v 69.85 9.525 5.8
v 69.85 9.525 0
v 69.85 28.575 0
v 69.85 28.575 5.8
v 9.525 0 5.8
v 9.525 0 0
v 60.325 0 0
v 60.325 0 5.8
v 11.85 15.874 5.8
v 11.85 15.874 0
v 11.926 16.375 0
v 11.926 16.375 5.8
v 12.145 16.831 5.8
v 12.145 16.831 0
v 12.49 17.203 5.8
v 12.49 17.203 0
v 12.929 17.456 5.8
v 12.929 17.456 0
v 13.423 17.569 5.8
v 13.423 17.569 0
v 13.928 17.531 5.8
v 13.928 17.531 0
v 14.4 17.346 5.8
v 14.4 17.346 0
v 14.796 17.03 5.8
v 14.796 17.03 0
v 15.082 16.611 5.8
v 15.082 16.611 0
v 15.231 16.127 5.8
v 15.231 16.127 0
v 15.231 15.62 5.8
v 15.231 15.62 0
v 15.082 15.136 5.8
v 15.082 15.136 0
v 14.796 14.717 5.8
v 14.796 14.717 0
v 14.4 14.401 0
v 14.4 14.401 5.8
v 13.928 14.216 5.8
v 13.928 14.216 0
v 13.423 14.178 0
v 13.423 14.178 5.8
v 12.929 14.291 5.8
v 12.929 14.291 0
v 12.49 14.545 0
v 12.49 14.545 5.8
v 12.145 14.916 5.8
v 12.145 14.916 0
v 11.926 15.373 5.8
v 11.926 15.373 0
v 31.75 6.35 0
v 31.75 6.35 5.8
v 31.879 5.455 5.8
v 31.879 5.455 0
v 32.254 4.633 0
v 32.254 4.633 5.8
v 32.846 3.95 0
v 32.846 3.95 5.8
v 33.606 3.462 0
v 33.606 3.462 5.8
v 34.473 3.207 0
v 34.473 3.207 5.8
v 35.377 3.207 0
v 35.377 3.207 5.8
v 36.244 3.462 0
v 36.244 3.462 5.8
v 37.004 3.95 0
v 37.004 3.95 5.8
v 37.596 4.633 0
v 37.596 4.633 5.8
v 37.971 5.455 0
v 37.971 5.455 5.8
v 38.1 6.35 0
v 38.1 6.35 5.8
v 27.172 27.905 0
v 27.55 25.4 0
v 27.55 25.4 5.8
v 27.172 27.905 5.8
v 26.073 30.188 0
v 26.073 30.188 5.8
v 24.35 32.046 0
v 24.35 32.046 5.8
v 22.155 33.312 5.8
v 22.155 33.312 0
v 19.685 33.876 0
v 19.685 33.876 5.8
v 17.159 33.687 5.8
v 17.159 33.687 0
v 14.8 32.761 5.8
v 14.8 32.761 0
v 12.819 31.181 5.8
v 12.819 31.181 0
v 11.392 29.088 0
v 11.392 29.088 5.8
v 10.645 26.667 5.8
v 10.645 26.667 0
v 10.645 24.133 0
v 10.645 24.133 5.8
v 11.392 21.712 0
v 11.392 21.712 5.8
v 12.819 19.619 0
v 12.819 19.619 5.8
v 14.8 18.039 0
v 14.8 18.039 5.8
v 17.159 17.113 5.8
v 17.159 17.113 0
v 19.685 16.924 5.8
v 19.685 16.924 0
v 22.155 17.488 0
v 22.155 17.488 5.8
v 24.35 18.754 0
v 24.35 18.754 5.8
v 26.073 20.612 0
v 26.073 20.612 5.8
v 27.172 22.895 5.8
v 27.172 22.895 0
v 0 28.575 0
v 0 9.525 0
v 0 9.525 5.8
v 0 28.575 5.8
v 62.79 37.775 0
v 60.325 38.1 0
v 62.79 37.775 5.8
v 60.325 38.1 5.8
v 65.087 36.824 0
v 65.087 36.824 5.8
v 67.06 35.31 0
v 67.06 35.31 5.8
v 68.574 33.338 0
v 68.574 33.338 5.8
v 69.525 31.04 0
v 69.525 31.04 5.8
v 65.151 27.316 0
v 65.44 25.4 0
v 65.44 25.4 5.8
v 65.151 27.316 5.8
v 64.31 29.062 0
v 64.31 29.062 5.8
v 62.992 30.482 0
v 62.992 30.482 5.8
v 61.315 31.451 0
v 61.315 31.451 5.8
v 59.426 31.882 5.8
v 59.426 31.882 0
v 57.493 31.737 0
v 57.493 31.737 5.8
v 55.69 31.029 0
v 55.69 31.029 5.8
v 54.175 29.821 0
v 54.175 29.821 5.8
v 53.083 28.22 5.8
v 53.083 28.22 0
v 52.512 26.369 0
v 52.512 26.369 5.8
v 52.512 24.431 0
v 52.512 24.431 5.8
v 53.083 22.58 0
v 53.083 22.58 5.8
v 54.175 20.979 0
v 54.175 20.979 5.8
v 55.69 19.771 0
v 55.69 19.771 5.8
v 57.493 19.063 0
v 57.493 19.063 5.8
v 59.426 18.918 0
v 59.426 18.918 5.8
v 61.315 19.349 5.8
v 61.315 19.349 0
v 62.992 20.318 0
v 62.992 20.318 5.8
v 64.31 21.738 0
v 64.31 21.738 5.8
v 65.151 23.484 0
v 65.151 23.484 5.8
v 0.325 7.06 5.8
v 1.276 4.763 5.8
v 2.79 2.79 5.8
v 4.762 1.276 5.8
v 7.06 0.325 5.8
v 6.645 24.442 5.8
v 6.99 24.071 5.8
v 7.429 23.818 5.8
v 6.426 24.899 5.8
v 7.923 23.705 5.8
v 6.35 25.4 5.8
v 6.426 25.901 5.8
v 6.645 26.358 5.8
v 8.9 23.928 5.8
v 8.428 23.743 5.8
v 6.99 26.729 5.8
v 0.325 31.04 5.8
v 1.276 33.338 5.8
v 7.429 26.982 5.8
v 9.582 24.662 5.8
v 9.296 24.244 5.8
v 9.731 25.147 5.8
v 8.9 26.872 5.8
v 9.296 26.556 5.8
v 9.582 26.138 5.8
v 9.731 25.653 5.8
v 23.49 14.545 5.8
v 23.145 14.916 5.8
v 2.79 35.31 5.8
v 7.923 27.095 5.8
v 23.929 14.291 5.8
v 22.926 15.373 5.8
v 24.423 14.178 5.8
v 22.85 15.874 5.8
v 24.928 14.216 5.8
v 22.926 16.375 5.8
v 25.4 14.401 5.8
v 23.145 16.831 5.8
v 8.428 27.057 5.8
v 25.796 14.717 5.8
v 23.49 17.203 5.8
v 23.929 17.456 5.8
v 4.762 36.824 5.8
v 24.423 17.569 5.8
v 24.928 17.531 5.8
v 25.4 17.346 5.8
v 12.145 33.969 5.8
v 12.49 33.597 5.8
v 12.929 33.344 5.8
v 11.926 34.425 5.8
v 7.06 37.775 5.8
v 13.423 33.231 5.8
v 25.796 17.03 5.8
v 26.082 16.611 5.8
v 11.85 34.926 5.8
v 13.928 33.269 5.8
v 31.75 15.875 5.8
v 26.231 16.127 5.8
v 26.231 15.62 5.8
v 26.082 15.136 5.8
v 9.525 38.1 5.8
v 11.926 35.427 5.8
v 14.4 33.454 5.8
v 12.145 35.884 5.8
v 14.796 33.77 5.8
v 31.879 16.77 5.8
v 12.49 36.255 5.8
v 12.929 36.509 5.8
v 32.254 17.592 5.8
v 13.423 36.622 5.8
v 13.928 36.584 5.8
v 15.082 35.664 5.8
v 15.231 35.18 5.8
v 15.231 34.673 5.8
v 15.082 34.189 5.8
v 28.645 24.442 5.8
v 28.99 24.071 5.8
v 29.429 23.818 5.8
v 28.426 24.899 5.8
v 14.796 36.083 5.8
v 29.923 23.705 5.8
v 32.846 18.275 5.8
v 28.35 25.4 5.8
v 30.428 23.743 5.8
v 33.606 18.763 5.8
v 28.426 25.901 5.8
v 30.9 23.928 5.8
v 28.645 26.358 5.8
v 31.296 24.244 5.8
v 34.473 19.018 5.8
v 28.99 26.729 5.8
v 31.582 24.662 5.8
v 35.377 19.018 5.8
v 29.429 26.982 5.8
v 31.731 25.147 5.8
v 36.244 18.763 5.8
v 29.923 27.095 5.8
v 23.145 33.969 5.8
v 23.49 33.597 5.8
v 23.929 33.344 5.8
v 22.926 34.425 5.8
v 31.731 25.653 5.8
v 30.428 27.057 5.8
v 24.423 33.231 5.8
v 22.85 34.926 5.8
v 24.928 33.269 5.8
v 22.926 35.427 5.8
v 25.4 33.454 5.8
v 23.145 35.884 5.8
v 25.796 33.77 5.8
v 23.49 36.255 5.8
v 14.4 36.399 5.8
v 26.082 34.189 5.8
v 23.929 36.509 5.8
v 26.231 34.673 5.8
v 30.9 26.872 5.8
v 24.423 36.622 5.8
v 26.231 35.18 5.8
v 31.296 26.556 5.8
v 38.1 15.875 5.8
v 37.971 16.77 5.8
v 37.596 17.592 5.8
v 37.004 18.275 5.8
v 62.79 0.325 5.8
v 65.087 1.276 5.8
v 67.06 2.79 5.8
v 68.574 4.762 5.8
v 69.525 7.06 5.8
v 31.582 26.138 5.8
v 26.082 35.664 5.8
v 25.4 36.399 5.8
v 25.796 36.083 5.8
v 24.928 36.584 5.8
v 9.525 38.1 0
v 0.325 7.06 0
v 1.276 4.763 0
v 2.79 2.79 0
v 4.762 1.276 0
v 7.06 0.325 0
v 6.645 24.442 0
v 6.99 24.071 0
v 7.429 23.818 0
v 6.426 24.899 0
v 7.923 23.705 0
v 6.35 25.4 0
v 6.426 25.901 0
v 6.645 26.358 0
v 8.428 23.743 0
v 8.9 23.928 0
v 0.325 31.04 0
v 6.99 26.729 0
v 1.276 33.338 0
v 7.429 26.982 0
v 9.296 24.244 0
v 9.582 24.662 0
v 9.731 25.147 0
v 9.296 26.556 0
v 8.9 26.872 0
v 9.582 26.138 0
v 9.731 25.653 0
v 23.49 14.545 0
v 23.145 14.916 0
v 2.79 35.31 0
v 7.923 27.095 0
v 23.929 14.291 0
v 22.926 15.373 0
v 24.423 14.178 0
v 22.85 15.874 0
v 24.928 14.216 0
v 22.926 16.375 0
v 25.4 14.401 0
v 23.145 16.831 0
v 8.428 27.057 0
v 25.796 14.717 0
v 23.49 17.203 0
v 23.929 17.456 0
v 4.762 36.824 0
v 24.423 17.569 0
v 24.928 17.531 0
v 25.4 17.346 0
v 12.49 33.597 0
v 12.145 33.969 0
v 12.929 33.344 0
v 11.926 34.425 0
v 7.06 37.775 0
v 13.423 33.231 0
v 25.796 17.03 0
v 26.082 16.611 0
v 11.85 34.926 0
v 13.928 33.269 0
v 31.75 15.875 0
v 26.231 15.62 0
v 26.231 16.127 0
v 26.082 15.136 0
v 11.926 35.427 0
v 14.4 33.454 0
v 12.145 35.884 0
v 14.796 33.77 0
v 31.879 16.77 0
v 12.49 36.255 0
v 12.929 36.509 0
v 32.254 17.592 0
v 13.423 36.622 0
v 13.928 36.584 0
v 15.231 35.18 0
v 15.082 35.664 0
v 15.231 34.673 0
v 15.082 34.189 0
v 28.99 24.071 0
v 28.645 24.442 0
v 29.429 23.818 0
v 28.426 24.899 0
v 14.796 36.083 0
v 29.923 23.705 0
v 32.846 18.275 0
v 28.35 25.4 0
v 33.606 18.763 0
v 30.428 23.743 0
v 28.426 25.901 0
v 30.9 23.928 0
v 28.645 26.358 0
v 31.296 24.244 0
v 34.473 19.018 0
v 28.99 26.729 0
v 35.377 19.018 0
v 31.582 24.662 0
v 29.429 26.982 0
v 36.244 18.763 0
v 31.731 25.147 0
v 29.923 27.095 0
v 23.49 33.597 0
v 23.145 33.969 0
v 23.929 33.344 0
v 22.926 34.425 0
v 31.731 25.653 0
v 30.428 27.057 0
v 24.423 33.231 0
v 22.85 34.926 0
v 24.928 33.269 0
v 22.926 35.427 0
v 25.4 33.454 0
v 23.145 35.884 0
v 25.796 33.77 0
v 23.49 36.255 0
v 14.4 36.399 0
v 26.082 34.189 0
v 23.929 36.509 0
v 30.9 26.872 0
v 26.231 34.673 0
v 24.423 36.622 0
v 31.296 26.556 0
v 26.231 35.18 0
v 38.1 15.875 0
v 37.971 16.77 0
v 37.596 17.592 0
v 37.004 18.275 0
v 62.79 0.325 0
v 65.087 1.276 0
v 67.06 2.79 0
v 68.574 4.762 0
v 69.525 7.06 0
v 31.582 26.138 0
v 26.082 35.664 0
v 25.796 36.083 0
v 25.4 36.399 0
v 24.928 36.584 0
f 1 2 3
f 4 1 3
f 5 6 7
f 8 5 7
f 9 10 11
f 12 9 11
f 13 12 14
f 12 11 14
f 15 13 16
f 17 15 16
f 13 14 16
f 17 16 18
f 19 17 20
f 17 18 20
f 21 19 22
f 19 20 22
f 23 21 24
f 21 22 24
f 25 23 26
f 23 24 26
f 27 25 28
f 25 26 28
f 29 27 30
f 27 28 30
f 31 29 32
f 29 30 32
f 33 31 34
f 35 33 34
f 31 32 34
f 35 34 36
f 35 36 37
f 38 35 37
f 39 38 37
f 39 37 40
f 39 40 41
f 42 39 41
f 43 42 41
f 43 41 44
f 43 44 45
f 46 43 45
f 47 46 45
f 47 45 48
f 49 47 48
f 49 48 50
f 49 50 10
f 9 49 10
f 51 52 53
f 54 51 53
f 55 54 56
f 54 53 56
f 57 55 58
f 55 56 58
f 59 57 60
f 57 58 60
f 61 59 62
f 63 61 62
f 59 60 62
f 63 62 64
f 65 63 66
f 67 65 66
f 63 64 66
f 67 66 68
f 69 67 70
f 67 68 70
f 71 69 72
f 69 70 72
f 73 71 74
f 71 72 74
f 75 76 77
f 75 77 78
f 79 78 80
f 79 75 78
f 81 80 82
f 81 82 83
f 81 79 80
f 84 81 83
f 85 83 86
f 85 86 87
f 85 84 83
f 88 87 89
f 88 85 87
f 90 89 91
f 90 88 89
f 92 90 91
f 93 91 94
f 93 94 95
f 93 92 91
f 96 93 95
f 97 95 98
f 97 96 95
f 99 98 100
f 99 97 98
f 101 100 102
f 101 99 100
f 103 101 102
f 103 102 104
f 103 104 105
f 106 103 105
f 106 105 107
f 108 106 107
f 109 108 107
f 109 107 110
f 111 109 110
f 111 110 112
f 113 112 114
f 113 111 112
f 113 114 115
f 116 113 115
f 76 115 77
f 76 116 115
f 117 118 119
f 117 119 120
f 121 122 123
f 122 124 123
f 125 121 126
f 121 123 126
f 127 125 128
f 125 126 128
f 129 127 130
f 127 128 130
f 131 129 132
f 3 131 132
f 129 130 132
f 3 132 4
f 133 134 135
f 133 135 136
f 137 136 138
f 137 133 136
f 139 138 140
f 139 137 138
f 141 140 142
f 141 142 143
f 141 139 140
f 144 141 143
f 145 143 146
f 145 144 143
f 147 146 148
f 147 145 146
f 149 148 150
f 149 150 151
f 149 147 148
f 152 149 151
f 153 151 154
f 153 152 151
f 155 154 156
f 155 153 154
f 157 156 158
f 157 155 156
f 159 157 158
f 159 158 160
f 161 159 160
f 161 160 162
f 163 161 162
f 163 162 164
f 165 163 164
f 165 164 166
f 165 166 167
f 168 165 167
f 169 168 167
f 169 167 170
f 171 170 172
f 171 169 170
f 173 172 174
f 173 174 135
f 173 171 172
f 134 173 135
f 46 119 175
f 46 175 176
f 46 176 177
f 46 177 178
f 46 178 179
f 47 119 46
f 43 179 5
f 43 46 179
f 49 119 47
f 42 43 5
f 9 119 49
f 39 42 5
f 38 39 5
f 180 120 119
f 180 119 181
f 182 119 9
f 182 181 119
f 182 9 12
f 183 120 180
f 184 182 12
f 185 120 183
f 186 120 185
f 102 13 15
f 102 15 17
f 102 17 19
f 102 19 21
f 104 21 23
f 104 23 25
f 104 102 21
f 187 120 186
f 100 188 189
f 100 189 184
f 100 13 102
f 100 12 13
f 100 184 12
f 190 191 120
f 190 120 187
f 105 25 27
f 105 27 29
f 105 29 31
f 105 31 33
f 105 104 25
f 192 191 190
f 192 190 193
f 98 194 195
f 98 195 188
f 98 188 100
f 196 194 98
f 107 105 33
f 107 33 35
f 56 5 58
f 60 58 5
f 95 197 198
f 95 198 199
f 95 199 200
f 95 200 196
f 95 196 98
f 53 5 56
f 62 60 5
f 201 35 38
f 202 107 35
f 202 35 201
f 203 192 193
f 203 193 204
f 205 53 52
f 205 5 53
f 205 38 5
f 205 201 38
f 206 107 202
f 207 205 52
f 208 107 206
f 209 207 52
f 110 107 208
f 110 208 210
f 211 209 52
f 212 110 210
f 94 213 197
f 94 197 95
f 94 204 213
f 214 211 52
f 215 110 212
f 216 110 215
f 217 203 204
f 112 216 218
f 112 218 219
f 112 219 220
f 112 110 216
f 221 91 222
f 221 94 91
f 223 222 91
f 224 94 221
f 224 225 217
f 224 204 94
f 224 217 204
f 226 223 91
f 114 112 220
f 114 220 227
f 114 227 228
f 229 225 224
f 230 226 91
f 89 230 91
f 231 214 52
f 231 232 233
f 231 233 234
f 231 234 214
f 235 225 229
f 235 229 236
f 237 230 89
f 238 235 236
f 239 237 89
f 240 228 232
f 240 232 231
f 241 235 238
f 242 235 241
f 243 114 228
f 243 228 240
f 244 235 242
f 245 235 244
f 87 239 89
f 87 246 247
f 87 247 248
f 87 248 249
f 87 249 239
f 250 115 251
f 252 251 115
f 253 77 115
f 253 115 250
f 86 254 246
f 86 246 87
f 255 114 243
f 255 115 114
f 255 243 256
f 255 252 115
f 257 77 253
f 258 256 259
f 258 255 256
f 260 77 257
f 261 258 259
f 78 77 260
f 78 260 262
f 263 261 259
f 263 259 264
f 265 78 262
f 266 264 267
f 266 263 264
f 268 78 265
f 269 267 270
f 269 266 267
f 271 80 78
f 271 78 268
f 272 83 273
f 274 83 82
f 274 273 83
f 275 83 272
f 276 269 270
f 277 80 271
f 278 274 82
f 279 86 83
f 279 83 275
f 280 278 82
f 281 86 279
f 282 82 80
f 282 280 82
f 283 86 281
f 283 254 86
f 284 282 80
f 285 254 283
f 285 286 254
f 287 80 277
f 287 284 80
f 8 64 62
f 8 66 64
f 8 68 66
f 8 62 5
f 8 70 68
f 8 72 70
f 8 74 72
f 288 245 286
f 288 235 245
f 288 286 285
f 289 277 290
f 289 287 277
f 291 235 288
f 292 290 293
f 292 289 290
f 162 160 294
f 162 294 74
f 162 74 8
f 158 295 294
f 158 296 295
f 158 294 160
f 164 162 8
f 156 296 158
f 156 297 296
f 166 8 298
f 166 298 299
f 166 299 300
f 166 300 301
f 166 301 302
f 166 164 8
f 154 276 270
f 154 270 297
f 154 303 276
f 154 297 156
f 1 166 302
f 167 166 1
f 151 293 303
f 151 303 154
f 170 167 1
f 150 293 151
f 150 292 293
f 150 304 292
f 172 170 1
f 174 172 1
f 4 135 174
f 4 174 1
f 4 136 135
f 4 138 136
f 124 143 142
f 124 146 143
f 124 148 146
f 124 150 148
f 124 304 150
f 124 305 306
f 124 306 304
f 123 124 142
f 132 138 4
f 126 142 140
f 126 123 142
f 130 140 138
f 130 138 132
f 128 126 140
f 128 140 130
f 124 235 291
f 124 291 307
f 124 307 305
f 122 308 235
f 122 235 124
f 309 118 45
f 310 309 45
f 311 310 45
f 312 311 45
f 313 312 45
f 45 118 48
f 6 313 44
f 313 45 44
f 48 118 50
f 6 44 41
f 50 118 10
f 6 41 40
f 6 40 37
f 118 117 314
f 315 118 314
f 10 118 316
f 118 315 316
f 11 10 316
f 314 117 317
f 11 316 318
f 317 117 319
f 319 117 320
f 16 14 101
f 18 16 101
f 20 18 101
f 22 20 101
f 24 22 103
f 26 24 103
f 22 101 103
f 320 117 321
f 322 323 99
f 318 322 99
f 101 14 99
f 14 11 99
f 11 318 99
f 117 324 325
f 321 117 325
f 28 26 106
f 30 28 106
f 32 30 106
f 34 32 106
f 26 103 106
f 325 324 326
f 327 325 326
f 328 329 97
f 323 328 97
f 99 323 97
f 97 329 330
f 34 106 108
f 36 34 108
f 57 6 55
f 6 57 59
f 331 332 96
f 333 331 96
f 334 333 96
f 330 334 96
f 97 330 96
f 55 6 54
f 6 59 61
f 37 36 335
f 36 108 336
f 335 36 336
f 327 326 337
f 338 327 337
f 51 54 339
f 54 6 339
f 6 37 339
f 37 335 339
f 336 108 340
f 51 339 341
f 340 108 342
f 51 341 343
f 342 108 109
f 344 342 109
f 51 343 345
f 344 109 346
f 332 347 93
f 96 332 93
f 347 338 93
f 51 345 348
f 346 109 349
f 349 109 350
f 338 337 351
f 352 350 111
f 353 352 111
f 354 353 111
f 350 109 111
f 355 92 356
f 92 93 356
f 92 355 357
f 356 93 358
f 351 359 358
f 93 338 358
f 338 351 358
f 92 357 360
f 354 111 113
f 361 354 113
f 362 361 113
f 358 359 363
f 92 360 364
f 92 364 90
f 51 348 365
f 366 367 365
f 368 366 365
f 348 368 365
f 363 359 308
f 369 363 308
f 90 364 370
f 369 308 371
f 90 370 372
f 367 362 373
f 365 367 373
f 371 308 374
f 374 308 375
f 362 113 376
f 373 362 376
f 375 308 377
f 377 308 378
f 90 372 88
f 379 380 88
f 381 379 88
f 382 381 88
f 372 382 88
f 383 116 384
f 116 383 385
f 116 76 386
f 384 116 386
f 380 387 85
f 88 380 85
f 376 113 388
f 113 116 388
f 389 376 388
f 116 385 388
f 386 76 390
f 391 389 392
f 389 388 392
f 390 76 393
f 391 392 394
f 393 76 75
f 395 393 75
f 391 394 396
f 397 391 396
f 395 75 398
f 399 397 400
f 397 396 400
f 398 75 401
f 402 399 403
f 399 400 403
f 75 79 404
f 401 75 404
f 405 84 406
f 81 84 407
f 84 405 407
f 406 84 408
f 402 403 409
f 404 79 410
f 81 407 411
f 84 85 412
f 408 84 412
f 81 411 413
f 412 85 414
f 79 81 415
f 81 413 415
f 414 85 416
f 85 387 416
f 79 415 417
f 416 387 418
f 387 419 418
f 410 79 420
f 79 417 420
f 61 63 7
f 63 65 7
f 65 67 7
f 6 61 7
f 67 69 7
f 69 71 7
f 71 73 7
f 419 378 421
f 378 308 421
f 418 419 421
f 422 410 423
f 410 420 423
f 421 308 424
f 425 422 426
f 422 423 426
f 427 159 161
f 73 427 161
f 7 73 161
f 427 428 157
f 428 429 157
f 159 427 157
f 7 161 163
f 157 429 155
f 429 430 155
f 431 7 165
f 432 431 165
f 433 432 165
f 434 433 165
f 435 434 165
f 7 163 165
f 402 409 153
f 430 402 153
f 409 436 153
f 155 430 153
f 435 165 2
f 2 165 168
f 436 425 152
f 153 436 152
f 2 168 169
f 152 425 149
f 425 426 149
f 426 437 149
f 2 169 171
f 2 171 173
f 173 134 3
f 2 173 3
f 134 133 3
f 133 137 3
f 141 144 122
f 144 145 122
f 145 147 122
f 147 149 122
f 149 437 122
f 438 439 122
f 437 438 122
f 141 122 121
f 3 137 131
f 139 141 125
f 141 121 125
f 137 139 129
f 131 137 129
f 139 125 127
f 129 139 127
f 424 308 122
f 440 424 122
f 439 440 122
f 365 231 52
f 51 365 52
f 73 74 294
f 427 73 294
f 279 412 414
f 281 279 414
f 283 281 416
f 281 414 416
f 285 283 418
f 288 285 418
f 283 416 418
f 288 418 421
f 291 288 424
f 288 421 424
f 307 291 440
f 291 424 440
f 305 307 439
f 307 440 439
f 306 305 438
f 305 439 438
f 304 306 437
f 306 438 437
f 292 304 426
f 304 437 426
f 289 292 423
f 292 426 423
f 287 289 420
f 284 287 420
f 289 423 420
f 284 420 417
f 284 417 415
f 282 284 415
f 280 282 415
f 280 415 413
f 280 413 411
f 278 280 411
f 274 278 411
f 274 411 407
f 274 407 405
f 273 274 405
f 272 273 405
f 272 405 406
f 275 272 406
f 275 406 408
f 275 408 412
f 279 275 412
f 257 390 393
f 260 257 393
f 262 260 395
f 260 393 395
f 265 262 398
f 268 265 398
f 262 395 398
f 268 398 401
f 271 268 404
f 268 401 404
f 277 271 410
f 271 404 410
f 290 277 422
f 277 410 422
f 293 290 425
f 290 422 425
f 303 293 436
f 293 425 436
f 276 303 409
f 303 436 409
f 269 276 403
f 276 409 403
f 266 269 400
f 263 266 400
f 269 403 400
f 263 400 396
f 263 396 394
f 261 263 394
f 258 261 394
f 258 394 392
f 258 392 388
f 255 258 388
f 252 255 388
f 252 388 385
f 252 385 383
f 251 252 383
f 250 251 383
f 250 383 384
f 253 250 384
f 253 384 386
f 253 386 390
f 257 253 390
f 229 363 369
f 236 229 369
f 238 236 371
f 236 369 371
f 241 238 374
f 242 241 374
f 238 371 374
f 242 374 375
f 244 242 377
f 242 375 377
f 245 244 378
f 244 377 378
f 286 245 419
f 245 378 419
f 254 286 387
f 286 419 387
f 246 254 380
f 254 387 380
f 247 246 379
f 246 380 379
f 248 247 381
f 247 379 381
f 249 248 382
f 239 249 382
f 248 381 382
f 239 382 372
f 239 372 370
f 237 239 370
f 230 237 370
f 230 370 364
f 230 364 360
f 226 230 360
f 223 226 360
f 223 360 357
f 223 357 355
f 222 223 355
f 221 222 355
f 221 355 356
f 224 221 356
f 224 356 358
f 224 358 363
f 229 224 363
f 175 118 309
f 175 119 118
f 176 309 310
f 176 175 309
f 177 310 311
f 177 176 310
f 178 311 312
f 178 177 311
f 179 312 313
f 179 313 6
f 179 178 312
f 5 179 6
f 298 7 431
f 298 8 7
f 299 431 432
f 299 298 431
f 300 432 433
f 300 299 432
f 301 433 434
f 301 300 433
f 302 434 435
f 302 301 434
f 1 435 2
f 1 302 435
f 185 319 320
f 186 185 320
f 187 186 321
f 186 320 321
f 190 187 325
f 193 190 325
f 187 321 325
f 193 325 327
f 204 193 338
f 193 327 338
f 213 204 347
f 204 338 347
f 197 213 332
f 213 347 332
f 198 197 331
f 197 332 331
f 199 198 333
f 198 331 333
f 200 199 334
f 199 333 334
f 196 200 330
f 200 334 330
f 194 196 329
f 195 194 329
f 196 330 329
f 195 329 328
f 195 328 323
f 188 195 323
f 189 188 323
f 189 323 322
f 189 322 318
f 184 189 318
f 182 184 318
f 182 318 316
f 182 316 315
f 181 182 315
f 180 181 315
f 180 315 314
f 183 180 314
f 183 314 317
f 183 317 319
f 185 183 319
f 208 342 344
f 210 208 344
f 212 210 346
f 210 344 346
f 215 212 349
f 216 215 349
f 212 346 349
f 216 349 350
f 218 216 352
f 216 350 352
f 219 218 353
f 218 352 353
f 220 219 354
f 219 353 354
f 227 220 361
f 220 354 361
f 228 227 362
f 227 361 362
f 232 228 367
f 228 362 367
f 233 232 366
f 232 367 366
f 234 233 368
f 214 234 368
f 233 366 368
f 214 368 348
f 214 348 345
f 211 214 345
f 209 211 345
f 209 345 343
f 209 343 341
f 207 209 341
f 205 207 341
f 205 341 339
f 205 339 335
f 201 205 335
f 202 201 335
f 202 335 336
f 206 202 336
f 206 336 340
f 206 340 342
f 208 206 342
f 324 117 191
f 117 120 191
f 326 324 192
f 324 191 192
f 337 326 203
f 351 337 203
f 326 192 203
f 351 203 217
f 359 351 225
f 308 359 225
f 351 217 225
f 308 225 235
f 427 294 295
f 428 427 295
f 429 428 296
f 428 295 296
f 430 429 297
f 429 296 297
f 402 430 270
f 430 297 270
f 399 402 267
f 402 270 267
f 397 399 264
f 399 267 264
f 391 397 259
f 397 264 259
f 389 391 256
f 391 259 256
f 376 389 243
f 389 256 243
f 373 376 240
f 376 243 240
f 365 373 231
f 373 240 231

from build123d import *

# Parameters (mm, degrees)
SKETCH1_W            = 69.85
SKETCH1_H            = 38.1
SKETCH1_R            = 6.5
SKETCH1_R_2          = 8.5
BOSS_EXTRUDE1_DEPTH  = 5.8
M3_CLEARANCE_HOLE1_D = 3.4
CUT_EXTRUDE1_DEPTH   = 80.776390618
FILLET1_R            = 9.525


with BuildPart() as part:
    # Sketch1 → Boss-Extrude1 (new body)
    with BuildSketch(Plane.XY):
        with Locations((34.925, 19.05)):
            Rectangle(SKETCH1_W, SKETCH1_H)
        with Locations((58.939787697, 25.4)):
            Circle(SKETCH1_R, mode=Mode.SUBTRACT)
        with Locations((19.05, 25.4)):
            Circle(SKETCH1_R_2, mode=Mode.SUBTRACT)
    extrude(amount=BOSS_EXTRUDE1_DEPTH)

    # M3 Clearance Hole1 (through all)
    with Locations(Plane.XY.offset(5.8)):
        with Locations((30.05, 25.4), (24.55, 34.926279442), (13.55, 34.926279442), (8.05, 25.4), (13.55, 15.873720558), (24.55, 15.873720558)):
            Hole(M3_CLEARANCE_HOLE1_D / 2)

    # Sketch3 → Cut-Extrude1 (cut, through all)
    with BuildSketch(Plane.XY.offset(5.8)):
        with BuildLine():
            Line((31.75, 15.875), (31.75, 6.35))
            ThreePointArc((31.75, 6.35), (34.925, 3.175), (38.1, 6.35))
            Line((38.1, 6.35), (38.1, 15.875))
            ThreePointArc((38.1, 15.875), (34.925, 19.05), (31.75, 15.875))
        make_face()
    extrude(amount=-CUT_EXTRUDE1_DEPTH, mode=Mode.SUBTRACT)

    # Fillet1
    fillet1_edges = [part.edges().sort_by_distance(p)[0] for p in [
        (0, 0, 2.9),
        (0, 38.1, 2.9),
        (69.85, 38.1, 2.9),
        (69.85, 0, 2.9),
    ]]
    fillet(fillet1_edges, radius=FILLET1_R)


solid = part.part
